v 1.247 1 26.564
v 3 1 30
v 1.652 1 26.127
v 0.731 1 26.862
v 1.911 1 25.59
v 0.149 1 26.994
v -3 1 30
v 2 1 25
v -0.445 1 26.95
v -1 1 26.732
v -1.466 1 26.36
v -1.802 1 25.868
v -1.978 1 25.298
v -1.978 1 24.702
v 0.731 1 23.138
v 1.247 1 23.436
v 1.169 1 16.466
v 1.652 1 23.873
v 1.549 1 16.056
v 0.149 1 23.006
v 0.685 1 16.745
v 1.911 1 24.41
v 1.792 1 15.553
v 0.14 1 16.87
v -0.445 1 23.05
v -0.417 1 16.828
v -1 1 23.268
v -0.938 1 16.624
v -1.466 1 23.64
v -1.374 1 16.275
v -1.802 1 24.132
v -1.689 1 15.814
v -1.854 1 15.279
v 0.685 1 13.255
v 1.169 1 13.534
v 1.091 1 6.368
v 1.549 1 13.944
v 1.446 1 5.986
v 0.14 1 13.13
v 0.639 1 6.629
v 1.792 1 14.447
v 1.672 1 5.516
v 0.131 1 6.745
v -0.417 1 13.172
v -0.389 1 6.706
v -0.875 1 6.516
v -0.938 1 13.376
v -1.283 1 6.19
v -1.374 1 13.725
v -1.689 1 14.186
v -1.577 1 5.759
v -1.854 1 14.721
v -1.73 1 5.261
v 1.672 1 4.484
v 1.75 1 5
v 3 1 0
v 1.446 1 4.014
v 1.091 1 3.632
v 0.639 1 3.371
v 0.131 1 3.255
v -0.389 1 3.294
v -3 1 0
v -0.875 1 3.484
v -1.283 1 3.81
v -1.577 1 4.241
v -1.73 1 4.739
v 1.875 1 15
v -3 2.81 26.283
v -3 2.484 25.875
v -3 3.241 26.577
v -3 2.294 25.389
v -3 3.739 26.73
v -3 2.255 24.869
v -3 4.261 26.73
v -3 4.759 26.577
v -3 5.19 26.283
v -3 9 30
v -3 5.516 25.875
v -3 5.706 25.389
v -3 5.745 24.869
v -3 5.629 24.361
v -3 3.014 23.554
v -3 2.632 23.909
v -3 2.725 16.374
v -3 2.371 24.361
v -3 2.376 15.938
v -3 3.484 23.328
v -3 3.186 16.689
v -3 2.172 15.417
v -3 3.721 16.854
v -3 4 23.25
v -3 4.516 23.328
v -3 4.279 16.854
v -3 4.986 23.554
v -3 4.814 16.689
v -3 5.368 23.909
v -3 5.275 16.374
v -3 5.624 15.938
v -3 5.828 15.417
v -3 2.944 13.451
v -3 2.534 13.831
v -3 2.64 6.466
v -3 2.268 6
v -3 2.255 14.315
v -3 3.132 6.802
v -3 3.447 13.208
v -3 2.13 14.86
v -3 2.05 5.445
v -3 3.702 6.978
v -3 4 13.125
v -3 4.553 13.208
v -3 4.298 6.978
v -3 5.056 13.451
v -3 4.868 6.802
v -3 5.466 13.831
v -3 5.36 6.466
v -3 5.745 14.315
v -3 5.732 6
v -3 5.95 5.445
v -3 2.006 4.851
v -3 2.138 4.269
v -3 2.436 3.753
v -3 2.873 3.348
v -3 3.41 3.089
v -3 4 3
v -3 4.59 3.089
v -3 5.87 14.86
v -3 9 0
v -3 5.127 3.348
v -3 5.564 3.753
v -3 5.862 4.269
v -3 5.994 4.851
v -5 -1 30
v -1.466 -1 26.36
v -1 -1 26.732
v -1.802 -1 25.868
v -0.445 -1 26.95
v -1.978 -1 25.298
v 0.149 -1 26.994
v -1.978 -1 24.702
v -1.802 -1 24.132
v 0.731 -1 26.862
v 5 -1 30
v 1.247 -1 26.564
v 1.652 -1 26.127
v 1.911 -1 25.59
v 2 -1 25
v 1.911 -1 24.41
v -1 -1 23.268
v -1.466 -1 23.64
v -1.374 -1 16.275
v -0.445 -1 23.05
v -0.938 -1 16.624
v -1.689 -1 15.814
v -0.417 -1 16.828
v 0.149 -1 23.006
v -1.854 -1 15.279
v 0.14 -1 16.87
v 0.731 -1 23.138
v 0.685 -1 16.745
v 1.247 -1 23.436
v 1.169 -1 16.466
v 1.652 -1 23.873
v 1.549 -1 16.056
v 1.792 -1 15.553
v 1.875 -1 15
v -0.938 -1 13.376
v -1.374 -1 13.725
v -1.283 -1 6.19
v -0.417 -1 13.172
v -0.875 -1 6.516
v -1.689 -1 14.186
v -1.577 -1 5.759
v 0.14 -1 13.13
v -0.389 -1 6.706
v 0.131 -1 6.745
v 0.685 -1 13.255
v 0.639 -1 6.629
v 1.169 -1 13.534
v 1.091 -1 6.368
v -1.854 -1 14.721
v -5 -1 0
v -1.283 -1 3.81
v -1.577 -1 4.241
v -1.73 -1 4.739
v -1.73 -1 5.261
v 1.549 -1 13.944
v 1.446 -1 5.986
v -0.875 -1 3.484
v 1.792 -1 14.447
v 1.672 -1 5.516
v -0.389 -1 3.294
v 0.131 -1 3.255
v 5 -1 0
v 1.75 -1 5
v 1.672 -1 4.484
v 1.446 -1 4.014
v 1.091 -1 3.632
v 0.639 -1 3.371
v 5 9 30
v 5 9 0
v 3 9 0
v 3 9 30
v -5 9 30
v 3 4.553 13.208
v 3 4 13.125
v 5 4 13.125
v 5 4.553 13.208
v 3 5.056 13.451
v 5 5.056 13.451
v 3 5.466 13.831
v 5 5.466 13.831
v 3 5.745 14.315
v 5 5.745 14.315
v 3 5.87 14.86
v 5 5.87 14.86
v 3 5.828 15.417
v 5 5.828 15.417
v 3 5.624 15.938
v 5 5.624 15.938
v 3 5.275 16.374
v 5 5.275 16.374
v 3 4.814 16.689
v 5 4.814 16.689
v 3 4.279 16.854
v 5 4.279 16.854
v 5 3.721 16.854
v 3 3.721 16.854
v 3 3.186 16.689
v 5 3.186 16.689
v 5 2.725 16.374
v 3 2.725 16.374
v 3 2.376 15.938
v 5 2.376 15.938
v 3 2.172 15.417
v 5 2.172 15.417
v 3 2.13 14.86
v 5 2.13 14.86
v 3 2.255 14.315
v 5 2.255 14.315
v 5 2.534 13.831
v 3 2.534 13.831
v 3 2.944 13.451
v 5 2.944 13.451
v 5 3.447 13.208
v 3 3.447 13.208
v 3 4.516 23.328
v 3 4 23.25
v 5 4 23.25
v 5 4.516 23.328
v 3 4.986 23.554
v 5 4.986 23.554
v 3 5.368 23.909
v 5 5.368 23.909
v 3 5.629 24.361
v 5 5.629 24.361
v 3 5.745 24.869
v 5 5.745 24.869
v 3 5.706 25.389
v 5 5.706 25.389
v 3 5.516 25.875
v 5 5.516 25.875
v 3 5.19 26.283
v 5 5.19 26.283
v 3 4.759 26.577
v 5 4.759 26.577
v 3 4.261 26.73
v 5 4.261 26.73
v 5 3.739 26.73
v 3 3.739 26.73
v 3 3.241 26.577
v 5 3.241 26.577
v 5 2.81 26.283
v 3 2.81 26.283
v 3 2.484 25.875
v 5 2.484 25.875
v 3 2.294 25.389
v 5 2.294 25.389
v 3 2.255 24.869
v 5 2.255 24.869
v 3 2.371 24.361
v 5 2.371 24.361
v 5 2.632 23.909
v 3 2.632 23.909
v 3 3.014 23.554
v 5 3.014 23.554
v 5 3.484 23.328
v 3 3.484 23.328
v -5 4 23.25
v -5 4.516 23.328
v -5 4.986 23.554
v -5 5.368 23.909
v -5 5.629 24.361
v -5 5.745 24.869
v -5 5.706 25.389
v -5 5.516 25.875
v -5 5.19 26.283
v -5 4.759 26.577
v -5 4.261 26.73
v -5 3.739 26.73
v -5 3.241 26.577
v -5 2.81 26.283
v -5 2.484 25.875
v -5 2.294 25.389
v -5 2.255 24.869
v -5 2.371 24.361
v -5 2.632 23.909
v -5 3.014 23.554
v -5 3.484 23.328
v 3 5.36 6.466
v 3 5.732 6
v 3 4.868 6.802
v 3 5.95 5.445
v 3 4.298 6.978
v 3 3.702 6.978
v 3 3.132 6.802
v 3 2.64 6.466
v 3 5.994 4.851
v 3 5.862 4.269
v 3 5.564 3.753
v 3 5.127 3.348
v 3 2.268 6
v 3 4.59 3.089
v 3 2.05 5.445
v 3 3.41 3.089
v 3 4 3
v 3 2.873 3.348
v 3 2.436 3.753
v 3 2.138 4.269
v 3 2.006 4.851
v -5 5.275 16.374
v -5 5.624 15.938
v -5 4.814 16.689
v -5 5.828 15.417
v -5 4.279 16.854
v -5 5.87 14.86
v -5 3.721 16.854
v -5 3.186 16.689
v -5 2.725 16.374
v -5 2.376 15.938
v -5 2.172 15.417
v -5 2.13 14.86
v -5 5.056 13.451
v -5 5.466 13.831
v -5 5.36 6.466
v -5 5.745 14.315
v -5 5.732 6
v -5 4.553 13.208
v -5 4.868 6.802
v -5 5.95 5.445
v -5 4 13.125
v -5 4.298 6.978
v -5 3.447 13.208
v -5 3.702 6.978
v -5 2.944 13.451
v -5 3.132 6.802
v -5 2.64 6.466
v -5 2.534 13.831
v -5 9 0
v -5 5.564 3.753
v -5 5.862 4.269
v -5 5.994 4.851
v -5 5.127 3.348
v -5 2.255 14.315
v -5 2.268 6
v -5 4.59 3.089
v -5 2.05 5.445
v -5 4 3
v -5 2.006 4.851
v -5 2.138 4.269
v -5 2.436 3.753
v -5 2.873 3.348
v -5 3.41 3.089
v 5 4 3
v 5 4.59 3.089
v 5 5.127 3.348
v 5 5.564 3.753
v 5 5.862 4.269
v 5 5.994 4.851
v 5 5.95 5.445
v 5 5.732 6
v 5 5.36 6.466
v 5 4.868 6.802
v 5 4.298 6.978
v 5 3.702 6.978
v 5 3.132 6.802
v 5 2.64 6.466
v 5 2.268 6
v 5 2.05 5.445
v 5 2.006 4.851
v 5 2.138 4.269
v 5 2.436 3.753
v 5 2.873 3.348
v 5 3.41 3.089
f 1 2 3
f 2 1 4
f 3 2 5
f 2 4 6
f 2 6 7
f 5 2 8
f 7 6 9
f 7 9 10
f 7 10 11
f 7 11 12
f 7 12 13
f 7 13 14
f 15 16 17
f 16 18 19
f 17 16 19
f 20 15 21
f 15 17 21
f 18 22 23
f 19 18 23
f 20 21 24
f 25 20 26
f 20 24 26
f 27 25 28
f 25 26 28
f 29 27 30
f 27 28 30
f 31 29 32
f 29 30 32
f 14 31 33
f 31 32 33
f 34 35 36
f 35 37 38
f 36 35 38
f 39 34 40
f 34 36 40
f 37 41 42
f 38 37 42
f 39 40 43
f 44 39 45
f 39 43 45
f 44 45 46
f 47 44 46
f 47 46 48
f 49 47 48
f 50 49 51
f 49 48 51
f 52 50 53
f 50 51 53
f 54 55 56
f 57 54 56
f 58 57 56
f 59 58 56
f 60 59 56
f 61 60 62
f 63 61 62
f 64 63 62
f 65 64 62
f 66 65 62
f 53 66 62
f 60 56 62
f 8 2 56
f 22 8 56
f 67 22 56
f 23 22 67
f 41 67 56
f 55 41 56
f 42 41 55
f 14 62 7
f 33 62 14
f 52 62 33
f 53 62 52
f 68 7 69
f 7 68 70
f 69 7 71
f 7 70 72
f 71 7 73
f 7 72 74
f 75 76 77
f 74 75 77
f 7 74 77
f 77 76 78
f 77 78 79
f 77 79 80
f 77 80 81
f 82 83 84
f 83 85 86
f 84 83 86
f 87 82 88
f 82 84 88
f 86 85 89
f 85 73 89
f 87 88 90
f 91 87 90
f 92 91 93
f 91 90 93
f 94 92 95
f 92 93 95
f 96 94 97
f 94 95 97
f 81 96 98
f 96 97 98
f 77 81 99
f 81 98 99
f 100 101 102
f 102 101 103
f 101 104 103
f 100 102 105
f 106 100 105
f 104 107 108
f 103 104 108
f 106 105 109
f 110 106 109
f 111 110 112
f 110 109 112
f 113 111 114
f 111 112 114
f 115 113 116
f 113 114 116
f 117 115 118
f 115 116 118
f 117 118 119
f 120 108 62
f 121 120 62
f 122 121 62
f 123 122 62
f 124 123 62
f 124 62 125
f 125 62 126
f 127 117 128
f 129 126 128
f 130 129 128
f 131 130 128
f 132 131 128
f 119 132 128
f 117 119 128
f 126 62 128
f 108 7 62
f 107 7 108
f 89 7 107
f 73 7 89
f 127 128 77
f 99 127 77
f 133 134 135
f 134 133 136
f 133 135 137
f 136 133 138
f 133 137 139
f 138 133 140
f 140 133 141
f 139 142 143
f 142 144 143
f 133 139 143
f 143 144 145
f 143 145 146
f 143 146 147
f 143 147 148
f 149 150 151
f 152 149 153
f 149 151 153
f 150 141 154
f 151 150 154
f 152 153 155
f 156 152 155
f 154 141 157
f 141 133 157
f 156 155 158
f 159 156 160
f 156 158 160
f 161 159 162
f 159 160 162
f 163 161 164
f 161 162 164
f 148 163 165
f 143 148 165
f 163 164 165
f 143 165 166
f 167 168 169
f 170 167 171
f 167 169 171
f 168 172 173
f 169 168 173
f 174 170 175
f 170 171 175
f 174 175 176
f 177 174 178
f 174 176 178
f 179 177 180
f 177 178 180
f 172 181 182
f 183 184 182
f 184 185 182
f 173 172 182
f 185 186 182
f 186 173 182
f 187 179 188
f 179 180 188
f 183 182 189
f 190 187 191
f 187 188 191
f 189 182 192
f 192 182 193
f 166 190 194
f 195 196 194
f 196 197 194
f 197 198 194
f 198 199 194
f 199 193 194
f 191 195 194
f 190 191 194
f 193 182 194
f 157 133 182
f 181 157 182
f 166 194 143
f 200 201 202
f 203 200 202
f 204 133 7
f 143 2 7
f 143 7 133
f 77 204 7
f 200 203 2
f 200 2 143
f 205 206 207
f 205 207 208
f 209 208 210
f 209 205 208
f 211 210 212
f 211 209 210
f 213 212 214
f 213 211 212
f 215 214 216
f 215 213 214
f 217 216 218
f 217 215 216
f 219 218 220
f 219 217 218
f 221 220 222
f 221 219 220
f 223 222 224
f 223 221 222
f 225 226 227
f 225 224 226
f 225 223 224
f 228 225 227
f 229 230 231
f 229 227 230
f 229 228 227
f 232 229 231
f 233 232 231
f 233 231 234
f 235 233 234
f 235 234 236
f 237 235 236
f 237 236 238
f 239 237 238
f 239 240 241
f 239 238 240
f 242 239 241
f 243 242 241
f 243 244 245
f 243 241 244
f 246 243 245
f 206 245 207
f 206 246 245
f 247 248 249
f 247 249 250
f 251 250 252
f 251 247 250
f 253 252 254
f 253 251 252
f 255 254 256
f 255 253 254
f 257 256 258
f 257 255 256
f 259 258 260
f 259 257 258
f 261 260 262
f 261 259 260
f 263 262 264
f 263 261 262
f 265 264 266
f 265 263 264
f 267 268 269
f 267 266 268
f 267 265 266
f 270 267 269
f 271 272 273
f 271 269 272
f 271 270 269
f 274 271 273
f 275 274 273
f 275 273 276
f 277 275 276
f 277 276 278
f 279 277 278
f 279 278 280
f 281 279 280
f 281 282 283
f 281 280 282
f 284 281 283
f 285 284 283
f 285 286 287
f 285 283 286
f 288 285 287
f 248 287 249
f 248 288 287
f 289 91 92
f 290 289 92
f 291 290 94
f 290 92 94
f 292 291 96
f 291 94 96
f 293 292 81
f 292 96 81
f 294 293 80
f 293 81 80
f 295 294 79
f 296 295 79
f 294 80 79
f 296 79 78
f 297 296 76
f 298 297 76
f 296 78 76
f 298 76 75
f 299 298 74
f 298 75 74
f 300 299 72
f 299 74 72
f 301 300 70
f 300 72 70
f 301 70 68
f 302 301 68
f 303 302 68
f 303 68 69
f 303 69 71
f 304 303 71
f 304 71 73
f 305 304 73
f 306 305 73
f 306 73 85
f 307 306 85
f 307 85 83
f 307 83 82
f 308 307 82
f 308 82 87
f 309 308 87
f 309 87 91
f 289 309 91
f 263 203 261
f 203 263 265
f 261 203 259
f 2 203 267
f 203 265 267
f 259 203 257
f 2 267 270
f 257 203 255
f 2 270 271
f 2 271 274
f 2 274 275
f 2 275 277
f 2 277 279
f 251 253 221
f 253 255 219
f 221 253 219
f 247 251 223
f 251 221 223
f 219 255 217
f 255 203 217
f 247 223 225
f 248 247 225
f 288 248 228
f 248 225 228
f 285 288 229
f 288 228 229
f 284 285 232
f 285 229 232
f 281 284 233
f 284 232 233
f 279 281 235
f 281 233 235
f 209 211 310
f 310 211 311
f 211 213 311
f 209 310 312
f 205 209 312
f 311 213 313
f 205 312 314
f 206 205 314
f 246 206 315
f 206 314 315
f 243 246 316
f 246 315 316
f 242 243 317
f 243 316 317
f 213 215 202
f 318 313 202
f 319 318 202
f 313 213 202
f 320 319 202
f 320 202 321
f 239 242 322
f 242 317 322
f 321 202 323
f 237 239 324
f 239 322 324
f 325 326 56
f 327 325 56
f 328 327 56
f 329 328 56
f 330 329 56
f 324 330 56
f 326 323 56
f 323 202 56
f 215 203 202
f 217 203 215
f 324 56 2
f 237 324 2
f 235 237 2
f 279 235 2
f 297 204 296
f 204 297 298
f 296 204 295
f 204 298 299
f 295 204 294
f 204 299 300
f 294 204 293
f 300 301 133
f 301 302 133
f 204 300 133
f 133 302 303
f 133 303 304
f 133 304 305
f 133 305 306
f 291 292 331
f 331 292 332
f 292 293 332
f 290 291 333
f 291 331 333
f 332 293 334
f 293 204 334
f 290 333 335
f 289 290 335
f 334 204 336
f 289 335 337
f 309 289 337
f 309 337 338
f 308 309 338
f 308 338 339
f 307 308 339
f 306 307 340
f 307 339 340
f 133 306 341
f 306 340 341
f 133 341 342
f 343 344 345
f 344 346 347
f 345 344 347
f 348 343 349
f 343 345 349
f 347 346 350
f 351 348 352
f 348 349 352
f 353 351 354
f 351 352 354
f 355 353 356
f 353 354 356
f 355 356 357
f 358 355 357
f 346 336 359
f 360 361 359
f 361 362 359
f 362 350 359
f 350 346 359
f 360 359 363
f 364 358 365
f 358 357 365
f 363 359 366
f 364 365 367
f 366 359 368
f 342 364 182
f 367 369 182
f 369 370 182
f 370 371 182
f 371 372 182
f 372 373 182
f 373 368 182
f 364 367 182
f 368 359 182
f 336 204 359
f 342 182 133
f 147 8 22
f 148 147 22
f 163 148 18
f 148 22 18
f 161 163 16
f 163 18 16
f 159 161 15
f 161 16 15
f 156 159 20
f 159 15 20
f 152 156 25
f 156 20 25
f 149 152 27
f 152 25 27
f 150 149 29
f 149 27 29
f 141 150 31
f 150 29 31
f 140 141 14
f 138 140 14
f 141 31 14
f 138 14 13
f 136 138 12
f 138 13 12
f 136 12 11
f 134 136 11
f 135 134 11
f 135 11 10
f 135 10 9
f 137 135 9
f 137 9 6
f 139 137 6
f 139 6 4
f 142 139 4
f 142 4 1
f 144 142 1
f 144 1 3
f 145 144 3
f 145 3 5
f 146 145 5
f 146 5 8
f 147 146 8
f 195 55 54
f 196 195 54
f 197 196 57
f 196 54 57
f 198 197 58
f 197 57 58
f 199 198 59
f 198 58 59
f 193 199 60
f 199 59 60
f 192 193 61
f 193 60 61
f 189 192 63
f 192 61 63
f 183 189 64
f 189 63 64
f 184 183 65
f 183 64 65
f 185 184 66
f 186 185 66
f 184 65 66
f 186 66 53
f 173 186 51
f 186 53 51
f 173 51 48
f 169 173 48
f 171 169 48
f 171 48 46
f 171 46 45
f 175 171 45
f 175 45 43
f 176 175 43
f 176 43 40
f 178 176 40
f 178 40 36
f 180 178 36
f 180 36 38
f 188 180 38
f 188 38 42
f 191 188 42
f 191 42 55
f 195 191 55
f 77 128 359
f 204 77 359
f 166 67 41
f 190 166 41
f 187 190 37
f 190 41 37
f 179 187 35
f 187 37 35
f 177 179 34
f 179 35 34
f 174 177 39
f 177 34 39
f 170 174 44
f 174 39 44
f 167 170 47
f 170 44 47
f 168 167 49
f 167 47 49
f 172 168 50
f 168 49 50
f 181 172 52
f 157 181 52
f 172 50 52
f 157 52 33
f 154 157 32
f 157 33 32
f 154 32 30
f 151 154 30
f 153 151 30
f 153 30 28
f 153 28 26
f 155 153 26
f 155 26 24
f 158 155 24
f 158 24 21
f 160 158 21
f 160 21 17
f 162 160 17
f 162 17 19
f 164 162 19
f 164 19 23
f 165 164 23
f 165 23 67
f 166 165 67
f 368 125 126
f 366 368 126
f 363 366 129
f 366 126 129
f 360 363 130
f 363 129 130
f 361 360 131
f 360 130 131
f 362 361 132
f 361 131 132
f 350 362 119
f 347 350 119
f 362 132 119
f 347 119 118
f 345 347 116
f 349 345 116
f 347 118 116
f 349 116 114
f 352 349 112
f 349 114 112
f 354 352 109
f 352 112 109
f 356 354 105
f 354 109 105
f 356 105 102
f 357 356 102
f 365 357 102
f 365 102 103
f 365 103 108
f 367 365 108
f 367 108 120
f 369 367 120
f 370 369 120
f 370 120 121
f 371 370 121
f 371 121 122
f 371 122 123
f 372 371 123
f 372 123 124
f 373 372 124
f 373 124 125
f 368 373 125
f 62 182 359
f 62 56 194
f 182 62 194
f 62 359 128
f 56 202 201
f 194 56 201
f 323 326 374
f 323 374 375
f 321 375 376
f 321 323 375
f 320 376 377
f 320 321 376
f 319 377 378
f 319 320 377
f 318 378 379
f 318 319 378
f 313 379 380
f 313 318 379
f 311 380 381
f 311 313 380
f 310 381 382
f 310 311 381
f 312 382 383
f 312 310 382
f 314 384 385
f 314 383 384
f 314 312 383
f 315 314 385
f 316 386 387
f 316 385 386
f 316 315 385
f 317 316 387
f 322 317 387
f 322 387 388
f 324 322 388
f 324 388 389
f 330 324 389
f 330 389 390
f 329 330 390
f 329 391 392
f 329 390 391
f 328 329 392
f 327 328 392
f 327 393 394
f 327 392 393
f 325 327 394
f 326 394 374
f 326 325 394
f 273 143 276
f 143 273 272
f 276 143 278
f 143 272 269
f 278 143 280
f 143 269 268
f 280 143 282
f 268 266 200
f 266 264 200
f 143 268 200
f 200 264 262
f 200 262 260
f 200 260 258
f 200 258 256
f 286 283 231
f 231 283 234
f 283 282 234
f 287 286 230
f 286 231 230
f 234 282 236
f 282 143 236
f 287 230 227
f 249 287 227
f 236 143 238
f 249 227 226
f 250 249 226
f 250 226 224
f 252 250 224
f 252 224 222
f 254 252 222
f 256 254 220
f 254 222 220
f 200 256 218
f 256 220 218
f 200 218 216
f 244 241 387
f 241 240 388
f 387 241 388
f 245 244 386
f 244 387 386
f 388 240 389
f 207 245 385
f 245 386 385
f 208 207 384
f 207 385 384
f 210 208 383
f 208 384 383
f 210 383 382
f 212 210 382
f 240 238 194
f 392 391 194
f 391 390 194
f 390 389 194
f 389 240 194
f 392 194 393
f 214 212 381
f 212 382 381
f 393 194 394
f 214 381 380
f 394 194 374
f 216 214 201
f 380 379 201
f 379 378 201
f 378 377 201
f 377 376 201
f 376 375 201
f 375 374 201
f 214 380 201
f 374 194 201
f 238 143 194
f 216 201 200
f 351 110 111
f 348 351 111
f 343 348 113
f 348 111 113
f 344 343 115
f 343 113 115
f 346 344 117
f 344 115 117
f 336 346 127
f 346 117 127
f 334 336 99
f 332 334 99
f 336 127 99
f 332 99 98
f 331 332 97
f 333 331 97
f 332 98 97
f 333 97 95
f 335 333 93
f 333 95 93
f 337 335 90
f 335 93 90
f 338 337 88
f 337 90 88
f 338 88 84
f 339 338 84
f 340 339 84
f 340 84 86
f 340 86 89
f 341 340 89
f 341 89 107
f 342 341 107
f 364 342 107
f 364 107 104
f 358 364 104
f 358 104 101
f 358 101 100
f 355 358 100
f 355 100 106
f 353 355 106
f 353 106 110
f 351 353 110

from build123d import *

# Parameters (mm, degrees)
BOSS_EXTRUDE1_DEPTH     = 30
SKETCH2_R               = 1.75
SKETCH2_R_2             = 2
SKETCH2_R_3             = 1.875
CUT_EXTRUDE2_DEPTH      = 9
CUT_EXTRUDE2_DEPTH_BACK = 3
SKETCH3_R               = 1.75
SKETCH3_R_2             = 1.875
SKETCH3_R_3             = 2
CUT_EXTRUDE3_DEPTH      = 10


with BuildPart() as part:
    # Sketch1 → Boss-Extrude1 (new body)
    with BuildSketch(Plane.XY):
        Polygon((3, 1), (-3, 1), (-3, 9), (-5, 9), (-5, -1), (5, -1), (5, 9), (3, 9), align=None)
    extrude(amount=BOSS_EXTRUDE1_DEPTH)

    # Sketch2 → Cut-Extrude2 (cut, two sides)
    with BuildSketch(Plane(origin=(-3, 0, 0), x_dir=(0, 0, -1), z_dir=(1, 0, 0))) as cut_extrude2_sk:
        with Locations((-25, 4)):
            Circle(SKETCH2_R)
        with Locations((-5, 4)):
            Circle(SKETCH2_R_2)
        with Locations((-15, 4)):
            Circle(SKETCH2_R_3)
    extrude(amount=CUT_EXTRUDE2_DEPTH, mode=Mode.SUBTRACT)
    extrude(cut_extrude2_sk.sketch, amount=-CUT_EXTRUDE2_DEPTH_BACK, mode=Mode.SUBTRACT)

    # Sketch3 → Cut-Extrude3 (cut)
    with BuildSketch(Plane(origin=(0, 1, 0), x_dir=(1, 0, 0), z_dir=(0, 1, 0))):
        with Locations((0, -5)):
            Circle(SKETCH3_R)
        with Locations((0, -15)):
            Circle(SKETCH3_R_2)
        with Locations((0, -25)):
            Circle(SKETCH3_R_3)
    extrude(amount=-CUT_EXTRUDE3_DEPTH, mode=Mode.SUBTRACT)


solid = part.part
